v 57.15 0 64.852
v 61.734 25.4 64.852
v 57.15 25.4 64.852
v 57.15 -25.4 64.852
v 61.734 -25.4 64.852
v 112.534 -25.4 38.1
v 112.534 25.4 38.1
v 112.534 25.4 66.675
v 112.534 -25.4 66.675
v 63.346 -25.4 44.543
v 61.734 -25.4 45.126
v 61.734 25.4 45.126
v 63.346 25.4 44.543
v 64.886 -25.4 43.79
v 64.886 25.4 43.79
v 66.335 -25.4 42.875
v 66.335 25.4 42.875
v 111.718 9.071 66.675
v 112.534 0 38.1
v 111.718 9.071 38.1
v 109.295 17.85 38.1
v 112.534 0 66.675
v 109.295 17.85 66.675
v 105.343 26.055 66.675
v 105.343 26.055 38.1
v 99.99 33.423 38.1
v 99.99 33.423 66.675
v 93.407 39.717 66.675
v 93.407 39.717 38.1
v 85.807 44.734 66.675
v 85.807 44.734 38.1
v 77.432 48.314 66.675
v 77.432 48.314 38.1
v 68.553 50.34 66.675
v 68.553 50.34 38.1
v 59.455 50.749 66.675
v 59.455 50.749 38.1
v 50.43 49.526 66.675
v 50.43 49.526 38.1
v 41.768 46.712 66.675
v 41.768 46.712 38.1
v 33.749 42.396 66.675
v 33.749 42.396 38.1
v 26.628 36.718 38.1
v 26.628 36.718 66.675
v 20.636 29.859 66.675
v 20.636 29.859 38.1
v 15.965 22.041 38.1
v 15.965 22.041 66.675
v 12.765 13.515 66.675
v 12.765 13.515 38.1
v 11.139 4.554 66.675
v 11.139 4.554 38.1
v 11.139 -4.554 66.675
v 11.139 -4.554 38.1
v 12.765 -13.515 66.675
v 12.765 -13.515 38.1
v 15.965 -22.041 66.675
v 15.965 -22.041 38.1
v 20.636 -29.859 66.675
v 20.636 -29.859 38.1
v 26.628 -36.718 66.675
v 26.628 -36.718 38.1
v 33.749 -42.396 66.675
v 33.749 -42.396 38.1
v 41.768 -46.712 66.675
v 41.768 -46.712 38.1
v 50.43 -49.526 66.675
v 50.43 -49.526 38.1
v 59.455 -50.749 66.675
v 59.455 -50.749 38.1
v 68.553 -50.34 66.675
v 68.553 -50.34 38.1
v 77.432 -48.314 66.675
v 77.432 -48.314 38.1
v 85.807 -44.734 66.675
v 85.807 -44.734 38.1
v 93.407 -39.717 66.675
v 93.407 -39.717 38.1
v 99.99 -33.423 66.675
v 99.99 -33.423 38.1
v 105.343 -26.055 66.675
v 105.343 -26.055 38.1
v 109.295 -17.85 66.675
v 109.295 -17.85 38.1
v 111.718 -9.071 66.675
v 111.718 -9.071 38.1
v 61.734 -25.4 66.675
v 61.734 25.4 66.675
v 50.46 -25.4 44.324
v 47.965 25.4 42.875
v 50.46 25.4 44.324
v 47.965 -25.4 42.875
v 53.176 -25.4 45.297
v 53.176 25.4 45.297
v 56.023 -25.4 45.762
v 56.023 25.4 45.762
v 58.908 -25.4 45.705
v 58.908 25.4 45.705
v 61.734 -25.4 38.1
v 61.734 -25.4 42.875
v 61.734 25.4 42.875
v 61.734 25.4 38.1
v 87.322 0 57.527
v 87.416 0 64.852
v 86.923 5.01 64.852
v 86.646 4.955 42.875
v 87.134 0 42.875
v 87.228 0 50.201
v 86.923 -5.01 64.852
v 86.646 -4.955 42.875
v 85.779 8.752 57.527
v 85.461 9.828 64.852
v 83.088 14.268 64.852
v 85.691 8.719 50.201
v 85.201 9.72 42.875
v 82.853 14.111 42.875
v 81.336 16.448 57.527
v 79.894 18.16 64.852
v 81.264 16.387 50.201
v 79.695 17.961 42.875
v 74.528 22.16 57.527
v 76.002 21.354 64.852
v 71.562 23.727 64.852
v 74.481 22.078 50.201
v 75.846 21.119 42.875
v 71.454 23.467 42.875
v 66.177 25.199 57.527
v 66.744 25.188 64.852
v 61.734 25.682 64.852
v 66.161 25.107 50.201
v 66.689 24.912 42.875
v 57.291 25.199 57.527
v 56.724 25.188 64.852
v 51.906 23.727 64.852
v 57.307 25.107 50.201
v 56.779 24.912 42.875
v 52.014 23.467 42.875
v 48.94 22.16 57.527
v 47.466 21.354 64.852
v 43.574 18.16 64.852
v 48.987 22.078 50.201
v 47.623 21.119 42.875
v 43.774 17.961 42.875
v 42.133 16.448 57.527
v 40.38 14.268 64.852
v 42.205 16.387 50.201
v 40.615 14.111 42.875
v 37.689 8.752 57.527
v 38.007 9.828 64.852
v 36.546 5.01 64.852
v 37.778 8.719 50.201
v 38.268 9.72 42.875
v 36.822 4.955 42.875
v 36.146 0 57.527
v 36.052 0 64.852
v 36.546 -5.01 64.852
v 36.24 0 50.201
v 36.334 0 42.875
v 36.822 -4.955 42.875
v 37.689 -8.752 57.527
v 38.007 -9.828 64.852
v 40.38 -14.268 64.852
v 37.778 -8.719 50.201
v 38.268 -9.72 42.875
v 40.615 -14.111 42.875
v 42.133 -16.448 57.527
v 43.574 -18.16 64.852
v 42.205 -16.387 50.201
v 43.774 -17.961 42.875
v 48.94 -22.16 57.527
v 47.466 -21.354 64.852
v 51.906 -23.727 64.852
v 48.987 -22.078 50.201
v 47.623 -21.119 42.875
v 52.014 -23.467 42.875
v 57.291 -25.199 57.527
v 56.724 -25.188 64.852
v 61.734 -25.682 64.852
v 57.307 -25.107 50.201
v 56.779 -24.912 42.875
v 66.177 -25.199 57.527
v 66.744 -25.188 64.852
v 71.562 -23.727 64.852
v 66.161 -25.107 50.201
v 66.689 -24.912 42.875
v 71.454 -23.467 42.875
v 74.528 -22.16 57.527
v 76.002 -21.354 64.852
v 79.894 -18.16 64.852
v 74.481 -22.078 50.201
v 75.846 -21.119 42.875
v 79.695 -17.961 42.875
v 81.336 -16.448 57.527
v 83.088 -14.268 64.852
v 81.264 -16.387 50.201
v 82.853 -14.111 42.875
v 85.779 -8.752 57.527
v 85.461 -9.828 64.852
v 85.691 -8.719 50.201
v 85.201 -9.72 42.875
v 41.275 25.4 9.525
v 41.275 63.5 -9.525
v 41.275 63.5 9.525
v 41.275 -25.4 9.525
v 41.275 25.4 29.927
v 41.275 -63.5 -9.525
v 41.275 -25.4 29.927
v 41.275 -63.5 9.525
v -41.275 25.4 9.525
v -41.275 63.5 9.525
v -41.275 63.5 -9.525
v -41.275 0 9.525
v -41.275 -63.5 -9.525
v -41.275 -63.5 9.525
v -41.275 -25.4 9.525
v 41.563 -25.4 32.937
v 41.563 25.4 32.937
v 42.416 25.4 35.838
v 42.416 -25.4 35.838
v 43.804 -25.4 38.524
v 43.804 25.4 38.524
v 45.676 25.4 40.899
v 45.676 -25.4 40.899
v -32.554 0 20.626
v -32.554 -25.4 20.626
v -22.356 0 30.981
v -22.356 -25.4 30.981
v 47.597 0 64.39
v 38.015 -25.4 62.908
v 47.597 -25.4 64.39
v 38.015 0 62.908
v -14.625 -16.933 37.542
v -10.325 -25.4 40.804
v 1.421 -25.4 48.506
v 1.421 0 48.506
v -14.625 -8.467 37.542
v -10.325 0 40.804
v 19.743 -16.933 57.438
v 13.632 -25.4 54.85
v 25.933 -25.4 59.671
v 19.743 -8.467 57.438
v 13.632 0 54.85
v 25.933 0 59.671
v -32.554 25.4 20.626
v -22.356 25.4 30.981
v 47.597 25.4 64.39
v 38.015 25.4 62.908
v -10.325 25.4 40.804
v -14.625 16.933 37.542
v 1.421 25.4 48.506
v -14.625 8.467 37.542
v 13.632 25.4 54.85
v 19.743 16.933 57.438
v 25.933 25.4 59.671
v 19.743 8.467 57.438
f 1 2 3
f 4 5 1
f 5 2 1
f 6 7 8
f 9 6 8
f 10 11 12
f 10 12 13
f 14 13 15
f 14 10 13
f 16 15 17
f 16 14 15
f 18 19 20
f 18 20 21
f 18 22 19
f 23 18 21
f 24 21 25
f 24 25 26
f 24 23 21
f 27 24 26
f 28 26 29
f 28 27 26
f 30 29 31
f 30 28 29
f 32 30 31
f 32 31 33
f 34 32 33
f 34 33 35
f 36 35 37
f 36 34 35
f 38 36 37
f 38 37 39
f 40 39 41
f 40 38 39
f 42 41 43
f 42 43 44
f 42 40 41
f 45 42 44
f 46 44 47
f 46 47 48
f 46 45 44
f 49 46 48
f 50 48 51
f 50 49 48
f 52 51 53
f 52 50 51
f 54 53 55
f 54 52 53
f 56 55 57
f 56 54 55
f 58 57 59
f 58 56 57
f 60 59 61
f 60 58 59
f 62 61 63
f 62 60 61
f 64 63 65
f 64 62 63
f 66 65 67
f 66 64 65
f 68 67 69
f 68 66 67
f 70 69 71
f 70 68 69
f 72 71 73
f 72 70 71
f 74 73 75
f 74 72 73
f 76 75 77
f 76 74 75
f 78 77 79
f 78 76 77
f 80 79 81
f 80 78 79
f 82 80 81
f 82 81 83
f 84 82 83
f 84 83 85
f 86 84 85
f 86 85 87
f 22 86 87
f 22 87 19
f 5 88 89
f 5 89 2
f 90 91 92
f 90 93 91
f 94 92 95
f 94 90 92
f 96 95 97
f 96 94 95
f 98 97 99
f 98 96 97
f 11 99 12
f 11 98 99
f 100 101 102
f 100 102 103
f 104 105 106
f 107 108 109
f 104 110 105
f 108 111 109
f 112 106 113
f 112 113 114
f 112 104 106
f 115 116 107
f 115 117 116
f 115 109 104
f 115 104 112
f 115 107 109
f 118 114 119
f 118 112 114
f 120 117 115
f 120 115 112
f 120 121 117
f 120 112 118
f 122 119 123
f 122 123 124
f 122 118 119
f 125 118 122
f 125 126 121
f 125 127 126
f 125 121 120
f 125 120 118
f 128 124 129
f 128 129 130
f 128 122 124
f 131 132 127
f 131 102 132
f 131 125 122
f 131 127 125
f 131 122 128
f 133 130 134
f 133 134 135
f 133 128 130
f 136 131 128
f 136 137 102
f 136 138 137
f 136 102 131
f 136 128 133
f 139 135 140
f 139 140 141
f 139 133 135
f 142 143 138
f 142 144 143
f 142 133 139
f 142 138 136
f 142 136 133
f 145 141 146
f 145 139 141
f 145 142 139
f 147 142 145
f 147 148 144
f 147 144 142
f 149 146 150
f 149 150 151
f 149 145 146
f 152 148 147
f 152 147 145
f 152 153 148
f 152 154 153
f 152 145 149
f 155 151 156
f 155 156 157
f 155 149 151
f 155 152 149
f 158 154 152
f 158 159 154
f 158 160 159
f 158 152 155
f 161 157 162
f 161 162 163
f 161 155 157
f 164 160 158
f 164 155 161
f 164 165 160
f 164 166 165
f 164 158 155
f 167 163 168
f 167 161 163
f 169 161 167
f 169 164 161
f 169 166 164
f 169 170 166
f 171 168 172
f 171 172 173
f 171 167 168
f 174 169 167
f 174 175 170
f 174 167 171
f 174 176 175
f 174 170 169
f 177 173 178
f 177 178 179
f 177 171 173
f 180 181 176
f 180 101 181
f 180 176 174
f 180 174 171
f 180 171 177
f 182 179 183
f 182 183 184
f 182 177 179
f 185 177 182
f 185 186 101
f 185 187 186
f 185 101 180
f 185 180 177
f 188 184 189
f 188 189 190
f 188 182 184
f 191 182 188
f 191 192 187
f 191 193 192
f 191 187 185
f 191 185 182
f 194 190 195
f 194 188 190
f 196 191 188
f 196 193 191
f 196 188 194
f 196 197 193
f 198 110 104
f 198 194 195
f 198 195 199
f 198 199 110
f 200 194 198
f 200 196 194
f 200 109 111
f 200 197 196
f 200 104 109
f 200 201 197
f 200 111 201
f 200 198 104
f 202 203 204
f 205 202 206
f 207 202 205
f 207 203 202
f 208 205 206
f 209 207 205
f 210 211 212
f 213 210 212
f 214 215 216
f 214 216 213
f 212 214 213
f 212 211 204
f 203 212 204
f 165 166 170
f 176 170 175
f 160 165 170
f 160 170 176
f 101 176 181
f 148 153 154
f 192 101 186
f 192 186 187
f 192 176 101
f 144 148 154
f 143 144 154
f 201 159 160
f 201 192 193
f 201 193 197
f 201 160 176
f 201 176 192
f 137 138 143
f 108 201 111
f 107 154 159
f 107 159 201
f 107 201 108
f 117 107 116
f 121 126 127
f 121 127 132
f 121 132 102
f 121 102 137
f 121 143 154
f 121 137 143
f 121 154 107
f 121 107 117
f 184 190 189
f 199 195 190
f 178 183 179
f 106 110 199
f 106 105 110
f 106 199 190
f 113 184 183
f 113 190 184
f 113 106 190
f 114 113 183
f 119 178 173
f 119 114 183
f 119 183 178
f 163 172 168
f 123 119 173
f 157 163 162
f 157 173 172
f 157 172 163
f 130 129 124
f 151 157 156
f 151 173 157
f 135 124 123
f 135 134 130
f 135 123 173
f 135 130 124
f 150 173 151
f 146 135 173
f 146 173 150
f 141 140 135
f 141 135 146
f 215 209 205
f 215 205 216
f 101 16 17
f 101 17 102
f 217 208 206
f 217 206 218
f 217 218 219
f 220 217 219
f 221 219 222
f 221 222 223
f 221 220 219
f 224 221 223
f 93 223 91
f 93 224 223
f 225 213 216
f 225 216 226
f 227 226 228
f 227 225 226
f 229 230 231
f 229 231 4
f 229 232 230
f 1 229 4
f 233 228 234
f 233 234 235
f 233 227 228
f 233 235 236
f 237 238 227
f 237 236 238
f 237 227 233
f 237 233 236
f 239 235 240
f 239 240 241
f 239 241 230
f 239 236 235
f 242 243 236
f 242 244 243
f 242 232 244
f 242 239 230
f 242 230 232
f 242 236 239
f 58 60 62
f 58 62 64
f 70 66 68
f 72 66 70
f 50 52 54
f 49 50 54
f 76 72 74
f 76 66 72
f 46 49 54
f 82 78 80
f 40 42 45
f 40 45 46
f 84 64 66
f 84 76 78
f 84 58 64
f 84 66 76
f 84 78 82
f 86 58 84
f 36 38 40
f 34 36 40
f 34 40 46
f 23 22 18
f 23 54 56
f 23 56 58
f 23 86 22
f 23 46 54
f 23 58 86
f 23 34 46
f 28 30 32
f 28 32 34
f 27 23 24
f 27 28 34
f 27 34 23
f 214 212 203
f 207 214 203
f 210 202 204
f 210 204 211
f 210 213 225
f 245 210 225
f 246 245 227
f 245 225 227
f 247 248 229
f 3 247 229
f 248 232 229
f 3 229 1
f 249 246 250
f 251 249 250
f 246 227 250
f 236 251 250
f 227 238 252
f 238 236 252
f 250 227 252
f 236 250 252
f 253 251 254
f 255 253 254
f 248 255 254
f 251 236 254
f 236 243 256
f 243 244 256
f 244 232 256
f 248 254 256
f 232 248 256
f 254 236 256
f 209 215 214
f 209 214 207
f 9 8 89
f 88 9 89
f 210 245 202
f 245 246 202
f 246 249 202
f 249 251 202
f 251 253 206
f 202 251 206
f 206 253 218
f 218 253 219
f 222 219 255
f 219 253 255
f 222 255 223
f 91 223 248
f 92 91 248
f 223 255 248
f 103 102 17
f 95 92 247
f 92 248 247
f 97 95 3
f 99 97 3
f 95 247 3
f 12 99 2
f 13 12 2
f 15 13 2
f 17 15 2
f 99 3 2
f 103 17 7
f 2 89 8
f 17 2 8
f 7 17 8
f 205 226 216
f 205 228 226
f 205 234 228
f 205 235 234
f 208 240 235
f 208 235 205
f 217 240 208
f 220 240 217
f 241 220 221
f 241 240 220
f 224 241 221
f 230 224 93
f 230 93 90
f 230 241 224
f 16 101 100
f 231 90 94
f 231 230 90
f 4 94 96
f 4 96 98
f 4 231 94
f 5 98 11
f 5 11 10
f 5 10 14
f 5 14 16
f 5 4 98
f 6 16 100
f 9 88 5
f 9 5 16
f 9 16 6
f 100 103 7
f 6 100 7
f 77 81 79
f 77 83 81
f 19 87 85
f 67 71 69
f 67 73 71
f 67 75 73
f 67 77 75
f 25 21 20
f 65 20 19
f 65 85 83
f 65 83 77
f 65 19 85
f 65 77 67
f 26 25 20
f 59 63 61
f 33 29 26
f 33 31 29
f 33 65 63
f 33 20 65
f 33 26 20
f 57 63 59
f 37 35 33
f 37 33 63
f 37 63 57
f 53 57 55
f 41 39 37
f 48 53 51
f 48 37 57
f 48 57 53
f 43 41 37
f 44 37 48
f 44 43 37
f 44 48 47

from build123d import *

# Parameters (mm, degrees)
F1_DEPTH = 63.5
F2_DEPTH = 25.4
F3_DEPTH = 25.4


with BuildPart() as f1:
    # F0 (on Front) → F1 (new body, symmetric)
    with BuildSketch(Plane.XZ):
        Polygon((-41.275, 9.525), (-41.275, -9.525), (41.275, -9.525), (41.275, 9.525), (22.225, 9.525), align=None)
    extrude(amount=F1_DEPTH, both=True)

    # F0 (on Front) → F2 (join, symmetric)
    with BuildSketch(Plane.XZ):
        with BuildLine():
            add(Edge.make_bspline(
                [(-41.275, 9.525), (-20.042543, 40.149777), (19.782706, 65.131482), (57.15, 64.852284)],
                knots=[0, 0, 0, 0, 112.90965, 112.90965, 112.90965, 112.90965], degree=3))
            Line((-41.275, 9.525), (22.225, 9.525))
            Line((22.225, 9.525), (41.275, 9.525))
            Line((41.275, 9.525), (41.275, 29.927282))
            ThreePointArc((41.275, 29.927282), (43.046278, 37.214302), (47.964847, 42.8752))
            ThreePointArc((47.964847, 42.8752), (54.588939, 45.594336), (61.734077, 45.126027))
            Line((61.734077, 45.126027), (61.734077, 64.852284))
            Line((61.734077, 64.852284), (57.15, 64.852284))
        make_face()
    extrude(amount=F2_DEPTH, both=True)

    # F0 (on Front) → F3 (join, symmetric)
    with BuildSketch(Plane.XZ):
        Polygon((61.734077, 66.675), (61.734077, 64.852284), (87.416034, 64.852284), (87.134077, 42.8752), (66.335153, 42.8752), (61.734077, 42.8752), (61.734077, 38.1), (112.534077, 38.1), (112.534077, 66.675), align=None)
        with BuildLine():
            Line((87.416034, 64.852284), (61.734077, 64.852284))
            Line((61.734077, 64.852284), (61.734077, 45.126027))
            ThreePointArc((61.734077, 45.126027), (64.125993, 44.187406), (66.335153, 42.8752))
            Line((66.335153, 42.8752), (87.134077, 42.8752))
            Line((87.134077, 42.8752), (87.416034, 64.852284))
        make_face()
    extrude(amount=F3_DEPTH, both=True)


with BuildPart() as f4:
    # F0 (on Front) → F4 (revolve)
    with BuildSketch(Plane.XZ):
        Polygon((61.734077, 66.675), (61.734077, 64.852284), (87.416034, 64.852284), (87.134077, 42.8752), (66.335153, 42.8752), (61.734077, 42.8752), (61.734077, 38.1), (112.534077, 38.1), (112.534077, 66.675), align=None)
    revolve(axis=Axis((61.734077, 0, 52.3875), (0, 0, 1)))


solid = Compound([f1.part, f4.part])
